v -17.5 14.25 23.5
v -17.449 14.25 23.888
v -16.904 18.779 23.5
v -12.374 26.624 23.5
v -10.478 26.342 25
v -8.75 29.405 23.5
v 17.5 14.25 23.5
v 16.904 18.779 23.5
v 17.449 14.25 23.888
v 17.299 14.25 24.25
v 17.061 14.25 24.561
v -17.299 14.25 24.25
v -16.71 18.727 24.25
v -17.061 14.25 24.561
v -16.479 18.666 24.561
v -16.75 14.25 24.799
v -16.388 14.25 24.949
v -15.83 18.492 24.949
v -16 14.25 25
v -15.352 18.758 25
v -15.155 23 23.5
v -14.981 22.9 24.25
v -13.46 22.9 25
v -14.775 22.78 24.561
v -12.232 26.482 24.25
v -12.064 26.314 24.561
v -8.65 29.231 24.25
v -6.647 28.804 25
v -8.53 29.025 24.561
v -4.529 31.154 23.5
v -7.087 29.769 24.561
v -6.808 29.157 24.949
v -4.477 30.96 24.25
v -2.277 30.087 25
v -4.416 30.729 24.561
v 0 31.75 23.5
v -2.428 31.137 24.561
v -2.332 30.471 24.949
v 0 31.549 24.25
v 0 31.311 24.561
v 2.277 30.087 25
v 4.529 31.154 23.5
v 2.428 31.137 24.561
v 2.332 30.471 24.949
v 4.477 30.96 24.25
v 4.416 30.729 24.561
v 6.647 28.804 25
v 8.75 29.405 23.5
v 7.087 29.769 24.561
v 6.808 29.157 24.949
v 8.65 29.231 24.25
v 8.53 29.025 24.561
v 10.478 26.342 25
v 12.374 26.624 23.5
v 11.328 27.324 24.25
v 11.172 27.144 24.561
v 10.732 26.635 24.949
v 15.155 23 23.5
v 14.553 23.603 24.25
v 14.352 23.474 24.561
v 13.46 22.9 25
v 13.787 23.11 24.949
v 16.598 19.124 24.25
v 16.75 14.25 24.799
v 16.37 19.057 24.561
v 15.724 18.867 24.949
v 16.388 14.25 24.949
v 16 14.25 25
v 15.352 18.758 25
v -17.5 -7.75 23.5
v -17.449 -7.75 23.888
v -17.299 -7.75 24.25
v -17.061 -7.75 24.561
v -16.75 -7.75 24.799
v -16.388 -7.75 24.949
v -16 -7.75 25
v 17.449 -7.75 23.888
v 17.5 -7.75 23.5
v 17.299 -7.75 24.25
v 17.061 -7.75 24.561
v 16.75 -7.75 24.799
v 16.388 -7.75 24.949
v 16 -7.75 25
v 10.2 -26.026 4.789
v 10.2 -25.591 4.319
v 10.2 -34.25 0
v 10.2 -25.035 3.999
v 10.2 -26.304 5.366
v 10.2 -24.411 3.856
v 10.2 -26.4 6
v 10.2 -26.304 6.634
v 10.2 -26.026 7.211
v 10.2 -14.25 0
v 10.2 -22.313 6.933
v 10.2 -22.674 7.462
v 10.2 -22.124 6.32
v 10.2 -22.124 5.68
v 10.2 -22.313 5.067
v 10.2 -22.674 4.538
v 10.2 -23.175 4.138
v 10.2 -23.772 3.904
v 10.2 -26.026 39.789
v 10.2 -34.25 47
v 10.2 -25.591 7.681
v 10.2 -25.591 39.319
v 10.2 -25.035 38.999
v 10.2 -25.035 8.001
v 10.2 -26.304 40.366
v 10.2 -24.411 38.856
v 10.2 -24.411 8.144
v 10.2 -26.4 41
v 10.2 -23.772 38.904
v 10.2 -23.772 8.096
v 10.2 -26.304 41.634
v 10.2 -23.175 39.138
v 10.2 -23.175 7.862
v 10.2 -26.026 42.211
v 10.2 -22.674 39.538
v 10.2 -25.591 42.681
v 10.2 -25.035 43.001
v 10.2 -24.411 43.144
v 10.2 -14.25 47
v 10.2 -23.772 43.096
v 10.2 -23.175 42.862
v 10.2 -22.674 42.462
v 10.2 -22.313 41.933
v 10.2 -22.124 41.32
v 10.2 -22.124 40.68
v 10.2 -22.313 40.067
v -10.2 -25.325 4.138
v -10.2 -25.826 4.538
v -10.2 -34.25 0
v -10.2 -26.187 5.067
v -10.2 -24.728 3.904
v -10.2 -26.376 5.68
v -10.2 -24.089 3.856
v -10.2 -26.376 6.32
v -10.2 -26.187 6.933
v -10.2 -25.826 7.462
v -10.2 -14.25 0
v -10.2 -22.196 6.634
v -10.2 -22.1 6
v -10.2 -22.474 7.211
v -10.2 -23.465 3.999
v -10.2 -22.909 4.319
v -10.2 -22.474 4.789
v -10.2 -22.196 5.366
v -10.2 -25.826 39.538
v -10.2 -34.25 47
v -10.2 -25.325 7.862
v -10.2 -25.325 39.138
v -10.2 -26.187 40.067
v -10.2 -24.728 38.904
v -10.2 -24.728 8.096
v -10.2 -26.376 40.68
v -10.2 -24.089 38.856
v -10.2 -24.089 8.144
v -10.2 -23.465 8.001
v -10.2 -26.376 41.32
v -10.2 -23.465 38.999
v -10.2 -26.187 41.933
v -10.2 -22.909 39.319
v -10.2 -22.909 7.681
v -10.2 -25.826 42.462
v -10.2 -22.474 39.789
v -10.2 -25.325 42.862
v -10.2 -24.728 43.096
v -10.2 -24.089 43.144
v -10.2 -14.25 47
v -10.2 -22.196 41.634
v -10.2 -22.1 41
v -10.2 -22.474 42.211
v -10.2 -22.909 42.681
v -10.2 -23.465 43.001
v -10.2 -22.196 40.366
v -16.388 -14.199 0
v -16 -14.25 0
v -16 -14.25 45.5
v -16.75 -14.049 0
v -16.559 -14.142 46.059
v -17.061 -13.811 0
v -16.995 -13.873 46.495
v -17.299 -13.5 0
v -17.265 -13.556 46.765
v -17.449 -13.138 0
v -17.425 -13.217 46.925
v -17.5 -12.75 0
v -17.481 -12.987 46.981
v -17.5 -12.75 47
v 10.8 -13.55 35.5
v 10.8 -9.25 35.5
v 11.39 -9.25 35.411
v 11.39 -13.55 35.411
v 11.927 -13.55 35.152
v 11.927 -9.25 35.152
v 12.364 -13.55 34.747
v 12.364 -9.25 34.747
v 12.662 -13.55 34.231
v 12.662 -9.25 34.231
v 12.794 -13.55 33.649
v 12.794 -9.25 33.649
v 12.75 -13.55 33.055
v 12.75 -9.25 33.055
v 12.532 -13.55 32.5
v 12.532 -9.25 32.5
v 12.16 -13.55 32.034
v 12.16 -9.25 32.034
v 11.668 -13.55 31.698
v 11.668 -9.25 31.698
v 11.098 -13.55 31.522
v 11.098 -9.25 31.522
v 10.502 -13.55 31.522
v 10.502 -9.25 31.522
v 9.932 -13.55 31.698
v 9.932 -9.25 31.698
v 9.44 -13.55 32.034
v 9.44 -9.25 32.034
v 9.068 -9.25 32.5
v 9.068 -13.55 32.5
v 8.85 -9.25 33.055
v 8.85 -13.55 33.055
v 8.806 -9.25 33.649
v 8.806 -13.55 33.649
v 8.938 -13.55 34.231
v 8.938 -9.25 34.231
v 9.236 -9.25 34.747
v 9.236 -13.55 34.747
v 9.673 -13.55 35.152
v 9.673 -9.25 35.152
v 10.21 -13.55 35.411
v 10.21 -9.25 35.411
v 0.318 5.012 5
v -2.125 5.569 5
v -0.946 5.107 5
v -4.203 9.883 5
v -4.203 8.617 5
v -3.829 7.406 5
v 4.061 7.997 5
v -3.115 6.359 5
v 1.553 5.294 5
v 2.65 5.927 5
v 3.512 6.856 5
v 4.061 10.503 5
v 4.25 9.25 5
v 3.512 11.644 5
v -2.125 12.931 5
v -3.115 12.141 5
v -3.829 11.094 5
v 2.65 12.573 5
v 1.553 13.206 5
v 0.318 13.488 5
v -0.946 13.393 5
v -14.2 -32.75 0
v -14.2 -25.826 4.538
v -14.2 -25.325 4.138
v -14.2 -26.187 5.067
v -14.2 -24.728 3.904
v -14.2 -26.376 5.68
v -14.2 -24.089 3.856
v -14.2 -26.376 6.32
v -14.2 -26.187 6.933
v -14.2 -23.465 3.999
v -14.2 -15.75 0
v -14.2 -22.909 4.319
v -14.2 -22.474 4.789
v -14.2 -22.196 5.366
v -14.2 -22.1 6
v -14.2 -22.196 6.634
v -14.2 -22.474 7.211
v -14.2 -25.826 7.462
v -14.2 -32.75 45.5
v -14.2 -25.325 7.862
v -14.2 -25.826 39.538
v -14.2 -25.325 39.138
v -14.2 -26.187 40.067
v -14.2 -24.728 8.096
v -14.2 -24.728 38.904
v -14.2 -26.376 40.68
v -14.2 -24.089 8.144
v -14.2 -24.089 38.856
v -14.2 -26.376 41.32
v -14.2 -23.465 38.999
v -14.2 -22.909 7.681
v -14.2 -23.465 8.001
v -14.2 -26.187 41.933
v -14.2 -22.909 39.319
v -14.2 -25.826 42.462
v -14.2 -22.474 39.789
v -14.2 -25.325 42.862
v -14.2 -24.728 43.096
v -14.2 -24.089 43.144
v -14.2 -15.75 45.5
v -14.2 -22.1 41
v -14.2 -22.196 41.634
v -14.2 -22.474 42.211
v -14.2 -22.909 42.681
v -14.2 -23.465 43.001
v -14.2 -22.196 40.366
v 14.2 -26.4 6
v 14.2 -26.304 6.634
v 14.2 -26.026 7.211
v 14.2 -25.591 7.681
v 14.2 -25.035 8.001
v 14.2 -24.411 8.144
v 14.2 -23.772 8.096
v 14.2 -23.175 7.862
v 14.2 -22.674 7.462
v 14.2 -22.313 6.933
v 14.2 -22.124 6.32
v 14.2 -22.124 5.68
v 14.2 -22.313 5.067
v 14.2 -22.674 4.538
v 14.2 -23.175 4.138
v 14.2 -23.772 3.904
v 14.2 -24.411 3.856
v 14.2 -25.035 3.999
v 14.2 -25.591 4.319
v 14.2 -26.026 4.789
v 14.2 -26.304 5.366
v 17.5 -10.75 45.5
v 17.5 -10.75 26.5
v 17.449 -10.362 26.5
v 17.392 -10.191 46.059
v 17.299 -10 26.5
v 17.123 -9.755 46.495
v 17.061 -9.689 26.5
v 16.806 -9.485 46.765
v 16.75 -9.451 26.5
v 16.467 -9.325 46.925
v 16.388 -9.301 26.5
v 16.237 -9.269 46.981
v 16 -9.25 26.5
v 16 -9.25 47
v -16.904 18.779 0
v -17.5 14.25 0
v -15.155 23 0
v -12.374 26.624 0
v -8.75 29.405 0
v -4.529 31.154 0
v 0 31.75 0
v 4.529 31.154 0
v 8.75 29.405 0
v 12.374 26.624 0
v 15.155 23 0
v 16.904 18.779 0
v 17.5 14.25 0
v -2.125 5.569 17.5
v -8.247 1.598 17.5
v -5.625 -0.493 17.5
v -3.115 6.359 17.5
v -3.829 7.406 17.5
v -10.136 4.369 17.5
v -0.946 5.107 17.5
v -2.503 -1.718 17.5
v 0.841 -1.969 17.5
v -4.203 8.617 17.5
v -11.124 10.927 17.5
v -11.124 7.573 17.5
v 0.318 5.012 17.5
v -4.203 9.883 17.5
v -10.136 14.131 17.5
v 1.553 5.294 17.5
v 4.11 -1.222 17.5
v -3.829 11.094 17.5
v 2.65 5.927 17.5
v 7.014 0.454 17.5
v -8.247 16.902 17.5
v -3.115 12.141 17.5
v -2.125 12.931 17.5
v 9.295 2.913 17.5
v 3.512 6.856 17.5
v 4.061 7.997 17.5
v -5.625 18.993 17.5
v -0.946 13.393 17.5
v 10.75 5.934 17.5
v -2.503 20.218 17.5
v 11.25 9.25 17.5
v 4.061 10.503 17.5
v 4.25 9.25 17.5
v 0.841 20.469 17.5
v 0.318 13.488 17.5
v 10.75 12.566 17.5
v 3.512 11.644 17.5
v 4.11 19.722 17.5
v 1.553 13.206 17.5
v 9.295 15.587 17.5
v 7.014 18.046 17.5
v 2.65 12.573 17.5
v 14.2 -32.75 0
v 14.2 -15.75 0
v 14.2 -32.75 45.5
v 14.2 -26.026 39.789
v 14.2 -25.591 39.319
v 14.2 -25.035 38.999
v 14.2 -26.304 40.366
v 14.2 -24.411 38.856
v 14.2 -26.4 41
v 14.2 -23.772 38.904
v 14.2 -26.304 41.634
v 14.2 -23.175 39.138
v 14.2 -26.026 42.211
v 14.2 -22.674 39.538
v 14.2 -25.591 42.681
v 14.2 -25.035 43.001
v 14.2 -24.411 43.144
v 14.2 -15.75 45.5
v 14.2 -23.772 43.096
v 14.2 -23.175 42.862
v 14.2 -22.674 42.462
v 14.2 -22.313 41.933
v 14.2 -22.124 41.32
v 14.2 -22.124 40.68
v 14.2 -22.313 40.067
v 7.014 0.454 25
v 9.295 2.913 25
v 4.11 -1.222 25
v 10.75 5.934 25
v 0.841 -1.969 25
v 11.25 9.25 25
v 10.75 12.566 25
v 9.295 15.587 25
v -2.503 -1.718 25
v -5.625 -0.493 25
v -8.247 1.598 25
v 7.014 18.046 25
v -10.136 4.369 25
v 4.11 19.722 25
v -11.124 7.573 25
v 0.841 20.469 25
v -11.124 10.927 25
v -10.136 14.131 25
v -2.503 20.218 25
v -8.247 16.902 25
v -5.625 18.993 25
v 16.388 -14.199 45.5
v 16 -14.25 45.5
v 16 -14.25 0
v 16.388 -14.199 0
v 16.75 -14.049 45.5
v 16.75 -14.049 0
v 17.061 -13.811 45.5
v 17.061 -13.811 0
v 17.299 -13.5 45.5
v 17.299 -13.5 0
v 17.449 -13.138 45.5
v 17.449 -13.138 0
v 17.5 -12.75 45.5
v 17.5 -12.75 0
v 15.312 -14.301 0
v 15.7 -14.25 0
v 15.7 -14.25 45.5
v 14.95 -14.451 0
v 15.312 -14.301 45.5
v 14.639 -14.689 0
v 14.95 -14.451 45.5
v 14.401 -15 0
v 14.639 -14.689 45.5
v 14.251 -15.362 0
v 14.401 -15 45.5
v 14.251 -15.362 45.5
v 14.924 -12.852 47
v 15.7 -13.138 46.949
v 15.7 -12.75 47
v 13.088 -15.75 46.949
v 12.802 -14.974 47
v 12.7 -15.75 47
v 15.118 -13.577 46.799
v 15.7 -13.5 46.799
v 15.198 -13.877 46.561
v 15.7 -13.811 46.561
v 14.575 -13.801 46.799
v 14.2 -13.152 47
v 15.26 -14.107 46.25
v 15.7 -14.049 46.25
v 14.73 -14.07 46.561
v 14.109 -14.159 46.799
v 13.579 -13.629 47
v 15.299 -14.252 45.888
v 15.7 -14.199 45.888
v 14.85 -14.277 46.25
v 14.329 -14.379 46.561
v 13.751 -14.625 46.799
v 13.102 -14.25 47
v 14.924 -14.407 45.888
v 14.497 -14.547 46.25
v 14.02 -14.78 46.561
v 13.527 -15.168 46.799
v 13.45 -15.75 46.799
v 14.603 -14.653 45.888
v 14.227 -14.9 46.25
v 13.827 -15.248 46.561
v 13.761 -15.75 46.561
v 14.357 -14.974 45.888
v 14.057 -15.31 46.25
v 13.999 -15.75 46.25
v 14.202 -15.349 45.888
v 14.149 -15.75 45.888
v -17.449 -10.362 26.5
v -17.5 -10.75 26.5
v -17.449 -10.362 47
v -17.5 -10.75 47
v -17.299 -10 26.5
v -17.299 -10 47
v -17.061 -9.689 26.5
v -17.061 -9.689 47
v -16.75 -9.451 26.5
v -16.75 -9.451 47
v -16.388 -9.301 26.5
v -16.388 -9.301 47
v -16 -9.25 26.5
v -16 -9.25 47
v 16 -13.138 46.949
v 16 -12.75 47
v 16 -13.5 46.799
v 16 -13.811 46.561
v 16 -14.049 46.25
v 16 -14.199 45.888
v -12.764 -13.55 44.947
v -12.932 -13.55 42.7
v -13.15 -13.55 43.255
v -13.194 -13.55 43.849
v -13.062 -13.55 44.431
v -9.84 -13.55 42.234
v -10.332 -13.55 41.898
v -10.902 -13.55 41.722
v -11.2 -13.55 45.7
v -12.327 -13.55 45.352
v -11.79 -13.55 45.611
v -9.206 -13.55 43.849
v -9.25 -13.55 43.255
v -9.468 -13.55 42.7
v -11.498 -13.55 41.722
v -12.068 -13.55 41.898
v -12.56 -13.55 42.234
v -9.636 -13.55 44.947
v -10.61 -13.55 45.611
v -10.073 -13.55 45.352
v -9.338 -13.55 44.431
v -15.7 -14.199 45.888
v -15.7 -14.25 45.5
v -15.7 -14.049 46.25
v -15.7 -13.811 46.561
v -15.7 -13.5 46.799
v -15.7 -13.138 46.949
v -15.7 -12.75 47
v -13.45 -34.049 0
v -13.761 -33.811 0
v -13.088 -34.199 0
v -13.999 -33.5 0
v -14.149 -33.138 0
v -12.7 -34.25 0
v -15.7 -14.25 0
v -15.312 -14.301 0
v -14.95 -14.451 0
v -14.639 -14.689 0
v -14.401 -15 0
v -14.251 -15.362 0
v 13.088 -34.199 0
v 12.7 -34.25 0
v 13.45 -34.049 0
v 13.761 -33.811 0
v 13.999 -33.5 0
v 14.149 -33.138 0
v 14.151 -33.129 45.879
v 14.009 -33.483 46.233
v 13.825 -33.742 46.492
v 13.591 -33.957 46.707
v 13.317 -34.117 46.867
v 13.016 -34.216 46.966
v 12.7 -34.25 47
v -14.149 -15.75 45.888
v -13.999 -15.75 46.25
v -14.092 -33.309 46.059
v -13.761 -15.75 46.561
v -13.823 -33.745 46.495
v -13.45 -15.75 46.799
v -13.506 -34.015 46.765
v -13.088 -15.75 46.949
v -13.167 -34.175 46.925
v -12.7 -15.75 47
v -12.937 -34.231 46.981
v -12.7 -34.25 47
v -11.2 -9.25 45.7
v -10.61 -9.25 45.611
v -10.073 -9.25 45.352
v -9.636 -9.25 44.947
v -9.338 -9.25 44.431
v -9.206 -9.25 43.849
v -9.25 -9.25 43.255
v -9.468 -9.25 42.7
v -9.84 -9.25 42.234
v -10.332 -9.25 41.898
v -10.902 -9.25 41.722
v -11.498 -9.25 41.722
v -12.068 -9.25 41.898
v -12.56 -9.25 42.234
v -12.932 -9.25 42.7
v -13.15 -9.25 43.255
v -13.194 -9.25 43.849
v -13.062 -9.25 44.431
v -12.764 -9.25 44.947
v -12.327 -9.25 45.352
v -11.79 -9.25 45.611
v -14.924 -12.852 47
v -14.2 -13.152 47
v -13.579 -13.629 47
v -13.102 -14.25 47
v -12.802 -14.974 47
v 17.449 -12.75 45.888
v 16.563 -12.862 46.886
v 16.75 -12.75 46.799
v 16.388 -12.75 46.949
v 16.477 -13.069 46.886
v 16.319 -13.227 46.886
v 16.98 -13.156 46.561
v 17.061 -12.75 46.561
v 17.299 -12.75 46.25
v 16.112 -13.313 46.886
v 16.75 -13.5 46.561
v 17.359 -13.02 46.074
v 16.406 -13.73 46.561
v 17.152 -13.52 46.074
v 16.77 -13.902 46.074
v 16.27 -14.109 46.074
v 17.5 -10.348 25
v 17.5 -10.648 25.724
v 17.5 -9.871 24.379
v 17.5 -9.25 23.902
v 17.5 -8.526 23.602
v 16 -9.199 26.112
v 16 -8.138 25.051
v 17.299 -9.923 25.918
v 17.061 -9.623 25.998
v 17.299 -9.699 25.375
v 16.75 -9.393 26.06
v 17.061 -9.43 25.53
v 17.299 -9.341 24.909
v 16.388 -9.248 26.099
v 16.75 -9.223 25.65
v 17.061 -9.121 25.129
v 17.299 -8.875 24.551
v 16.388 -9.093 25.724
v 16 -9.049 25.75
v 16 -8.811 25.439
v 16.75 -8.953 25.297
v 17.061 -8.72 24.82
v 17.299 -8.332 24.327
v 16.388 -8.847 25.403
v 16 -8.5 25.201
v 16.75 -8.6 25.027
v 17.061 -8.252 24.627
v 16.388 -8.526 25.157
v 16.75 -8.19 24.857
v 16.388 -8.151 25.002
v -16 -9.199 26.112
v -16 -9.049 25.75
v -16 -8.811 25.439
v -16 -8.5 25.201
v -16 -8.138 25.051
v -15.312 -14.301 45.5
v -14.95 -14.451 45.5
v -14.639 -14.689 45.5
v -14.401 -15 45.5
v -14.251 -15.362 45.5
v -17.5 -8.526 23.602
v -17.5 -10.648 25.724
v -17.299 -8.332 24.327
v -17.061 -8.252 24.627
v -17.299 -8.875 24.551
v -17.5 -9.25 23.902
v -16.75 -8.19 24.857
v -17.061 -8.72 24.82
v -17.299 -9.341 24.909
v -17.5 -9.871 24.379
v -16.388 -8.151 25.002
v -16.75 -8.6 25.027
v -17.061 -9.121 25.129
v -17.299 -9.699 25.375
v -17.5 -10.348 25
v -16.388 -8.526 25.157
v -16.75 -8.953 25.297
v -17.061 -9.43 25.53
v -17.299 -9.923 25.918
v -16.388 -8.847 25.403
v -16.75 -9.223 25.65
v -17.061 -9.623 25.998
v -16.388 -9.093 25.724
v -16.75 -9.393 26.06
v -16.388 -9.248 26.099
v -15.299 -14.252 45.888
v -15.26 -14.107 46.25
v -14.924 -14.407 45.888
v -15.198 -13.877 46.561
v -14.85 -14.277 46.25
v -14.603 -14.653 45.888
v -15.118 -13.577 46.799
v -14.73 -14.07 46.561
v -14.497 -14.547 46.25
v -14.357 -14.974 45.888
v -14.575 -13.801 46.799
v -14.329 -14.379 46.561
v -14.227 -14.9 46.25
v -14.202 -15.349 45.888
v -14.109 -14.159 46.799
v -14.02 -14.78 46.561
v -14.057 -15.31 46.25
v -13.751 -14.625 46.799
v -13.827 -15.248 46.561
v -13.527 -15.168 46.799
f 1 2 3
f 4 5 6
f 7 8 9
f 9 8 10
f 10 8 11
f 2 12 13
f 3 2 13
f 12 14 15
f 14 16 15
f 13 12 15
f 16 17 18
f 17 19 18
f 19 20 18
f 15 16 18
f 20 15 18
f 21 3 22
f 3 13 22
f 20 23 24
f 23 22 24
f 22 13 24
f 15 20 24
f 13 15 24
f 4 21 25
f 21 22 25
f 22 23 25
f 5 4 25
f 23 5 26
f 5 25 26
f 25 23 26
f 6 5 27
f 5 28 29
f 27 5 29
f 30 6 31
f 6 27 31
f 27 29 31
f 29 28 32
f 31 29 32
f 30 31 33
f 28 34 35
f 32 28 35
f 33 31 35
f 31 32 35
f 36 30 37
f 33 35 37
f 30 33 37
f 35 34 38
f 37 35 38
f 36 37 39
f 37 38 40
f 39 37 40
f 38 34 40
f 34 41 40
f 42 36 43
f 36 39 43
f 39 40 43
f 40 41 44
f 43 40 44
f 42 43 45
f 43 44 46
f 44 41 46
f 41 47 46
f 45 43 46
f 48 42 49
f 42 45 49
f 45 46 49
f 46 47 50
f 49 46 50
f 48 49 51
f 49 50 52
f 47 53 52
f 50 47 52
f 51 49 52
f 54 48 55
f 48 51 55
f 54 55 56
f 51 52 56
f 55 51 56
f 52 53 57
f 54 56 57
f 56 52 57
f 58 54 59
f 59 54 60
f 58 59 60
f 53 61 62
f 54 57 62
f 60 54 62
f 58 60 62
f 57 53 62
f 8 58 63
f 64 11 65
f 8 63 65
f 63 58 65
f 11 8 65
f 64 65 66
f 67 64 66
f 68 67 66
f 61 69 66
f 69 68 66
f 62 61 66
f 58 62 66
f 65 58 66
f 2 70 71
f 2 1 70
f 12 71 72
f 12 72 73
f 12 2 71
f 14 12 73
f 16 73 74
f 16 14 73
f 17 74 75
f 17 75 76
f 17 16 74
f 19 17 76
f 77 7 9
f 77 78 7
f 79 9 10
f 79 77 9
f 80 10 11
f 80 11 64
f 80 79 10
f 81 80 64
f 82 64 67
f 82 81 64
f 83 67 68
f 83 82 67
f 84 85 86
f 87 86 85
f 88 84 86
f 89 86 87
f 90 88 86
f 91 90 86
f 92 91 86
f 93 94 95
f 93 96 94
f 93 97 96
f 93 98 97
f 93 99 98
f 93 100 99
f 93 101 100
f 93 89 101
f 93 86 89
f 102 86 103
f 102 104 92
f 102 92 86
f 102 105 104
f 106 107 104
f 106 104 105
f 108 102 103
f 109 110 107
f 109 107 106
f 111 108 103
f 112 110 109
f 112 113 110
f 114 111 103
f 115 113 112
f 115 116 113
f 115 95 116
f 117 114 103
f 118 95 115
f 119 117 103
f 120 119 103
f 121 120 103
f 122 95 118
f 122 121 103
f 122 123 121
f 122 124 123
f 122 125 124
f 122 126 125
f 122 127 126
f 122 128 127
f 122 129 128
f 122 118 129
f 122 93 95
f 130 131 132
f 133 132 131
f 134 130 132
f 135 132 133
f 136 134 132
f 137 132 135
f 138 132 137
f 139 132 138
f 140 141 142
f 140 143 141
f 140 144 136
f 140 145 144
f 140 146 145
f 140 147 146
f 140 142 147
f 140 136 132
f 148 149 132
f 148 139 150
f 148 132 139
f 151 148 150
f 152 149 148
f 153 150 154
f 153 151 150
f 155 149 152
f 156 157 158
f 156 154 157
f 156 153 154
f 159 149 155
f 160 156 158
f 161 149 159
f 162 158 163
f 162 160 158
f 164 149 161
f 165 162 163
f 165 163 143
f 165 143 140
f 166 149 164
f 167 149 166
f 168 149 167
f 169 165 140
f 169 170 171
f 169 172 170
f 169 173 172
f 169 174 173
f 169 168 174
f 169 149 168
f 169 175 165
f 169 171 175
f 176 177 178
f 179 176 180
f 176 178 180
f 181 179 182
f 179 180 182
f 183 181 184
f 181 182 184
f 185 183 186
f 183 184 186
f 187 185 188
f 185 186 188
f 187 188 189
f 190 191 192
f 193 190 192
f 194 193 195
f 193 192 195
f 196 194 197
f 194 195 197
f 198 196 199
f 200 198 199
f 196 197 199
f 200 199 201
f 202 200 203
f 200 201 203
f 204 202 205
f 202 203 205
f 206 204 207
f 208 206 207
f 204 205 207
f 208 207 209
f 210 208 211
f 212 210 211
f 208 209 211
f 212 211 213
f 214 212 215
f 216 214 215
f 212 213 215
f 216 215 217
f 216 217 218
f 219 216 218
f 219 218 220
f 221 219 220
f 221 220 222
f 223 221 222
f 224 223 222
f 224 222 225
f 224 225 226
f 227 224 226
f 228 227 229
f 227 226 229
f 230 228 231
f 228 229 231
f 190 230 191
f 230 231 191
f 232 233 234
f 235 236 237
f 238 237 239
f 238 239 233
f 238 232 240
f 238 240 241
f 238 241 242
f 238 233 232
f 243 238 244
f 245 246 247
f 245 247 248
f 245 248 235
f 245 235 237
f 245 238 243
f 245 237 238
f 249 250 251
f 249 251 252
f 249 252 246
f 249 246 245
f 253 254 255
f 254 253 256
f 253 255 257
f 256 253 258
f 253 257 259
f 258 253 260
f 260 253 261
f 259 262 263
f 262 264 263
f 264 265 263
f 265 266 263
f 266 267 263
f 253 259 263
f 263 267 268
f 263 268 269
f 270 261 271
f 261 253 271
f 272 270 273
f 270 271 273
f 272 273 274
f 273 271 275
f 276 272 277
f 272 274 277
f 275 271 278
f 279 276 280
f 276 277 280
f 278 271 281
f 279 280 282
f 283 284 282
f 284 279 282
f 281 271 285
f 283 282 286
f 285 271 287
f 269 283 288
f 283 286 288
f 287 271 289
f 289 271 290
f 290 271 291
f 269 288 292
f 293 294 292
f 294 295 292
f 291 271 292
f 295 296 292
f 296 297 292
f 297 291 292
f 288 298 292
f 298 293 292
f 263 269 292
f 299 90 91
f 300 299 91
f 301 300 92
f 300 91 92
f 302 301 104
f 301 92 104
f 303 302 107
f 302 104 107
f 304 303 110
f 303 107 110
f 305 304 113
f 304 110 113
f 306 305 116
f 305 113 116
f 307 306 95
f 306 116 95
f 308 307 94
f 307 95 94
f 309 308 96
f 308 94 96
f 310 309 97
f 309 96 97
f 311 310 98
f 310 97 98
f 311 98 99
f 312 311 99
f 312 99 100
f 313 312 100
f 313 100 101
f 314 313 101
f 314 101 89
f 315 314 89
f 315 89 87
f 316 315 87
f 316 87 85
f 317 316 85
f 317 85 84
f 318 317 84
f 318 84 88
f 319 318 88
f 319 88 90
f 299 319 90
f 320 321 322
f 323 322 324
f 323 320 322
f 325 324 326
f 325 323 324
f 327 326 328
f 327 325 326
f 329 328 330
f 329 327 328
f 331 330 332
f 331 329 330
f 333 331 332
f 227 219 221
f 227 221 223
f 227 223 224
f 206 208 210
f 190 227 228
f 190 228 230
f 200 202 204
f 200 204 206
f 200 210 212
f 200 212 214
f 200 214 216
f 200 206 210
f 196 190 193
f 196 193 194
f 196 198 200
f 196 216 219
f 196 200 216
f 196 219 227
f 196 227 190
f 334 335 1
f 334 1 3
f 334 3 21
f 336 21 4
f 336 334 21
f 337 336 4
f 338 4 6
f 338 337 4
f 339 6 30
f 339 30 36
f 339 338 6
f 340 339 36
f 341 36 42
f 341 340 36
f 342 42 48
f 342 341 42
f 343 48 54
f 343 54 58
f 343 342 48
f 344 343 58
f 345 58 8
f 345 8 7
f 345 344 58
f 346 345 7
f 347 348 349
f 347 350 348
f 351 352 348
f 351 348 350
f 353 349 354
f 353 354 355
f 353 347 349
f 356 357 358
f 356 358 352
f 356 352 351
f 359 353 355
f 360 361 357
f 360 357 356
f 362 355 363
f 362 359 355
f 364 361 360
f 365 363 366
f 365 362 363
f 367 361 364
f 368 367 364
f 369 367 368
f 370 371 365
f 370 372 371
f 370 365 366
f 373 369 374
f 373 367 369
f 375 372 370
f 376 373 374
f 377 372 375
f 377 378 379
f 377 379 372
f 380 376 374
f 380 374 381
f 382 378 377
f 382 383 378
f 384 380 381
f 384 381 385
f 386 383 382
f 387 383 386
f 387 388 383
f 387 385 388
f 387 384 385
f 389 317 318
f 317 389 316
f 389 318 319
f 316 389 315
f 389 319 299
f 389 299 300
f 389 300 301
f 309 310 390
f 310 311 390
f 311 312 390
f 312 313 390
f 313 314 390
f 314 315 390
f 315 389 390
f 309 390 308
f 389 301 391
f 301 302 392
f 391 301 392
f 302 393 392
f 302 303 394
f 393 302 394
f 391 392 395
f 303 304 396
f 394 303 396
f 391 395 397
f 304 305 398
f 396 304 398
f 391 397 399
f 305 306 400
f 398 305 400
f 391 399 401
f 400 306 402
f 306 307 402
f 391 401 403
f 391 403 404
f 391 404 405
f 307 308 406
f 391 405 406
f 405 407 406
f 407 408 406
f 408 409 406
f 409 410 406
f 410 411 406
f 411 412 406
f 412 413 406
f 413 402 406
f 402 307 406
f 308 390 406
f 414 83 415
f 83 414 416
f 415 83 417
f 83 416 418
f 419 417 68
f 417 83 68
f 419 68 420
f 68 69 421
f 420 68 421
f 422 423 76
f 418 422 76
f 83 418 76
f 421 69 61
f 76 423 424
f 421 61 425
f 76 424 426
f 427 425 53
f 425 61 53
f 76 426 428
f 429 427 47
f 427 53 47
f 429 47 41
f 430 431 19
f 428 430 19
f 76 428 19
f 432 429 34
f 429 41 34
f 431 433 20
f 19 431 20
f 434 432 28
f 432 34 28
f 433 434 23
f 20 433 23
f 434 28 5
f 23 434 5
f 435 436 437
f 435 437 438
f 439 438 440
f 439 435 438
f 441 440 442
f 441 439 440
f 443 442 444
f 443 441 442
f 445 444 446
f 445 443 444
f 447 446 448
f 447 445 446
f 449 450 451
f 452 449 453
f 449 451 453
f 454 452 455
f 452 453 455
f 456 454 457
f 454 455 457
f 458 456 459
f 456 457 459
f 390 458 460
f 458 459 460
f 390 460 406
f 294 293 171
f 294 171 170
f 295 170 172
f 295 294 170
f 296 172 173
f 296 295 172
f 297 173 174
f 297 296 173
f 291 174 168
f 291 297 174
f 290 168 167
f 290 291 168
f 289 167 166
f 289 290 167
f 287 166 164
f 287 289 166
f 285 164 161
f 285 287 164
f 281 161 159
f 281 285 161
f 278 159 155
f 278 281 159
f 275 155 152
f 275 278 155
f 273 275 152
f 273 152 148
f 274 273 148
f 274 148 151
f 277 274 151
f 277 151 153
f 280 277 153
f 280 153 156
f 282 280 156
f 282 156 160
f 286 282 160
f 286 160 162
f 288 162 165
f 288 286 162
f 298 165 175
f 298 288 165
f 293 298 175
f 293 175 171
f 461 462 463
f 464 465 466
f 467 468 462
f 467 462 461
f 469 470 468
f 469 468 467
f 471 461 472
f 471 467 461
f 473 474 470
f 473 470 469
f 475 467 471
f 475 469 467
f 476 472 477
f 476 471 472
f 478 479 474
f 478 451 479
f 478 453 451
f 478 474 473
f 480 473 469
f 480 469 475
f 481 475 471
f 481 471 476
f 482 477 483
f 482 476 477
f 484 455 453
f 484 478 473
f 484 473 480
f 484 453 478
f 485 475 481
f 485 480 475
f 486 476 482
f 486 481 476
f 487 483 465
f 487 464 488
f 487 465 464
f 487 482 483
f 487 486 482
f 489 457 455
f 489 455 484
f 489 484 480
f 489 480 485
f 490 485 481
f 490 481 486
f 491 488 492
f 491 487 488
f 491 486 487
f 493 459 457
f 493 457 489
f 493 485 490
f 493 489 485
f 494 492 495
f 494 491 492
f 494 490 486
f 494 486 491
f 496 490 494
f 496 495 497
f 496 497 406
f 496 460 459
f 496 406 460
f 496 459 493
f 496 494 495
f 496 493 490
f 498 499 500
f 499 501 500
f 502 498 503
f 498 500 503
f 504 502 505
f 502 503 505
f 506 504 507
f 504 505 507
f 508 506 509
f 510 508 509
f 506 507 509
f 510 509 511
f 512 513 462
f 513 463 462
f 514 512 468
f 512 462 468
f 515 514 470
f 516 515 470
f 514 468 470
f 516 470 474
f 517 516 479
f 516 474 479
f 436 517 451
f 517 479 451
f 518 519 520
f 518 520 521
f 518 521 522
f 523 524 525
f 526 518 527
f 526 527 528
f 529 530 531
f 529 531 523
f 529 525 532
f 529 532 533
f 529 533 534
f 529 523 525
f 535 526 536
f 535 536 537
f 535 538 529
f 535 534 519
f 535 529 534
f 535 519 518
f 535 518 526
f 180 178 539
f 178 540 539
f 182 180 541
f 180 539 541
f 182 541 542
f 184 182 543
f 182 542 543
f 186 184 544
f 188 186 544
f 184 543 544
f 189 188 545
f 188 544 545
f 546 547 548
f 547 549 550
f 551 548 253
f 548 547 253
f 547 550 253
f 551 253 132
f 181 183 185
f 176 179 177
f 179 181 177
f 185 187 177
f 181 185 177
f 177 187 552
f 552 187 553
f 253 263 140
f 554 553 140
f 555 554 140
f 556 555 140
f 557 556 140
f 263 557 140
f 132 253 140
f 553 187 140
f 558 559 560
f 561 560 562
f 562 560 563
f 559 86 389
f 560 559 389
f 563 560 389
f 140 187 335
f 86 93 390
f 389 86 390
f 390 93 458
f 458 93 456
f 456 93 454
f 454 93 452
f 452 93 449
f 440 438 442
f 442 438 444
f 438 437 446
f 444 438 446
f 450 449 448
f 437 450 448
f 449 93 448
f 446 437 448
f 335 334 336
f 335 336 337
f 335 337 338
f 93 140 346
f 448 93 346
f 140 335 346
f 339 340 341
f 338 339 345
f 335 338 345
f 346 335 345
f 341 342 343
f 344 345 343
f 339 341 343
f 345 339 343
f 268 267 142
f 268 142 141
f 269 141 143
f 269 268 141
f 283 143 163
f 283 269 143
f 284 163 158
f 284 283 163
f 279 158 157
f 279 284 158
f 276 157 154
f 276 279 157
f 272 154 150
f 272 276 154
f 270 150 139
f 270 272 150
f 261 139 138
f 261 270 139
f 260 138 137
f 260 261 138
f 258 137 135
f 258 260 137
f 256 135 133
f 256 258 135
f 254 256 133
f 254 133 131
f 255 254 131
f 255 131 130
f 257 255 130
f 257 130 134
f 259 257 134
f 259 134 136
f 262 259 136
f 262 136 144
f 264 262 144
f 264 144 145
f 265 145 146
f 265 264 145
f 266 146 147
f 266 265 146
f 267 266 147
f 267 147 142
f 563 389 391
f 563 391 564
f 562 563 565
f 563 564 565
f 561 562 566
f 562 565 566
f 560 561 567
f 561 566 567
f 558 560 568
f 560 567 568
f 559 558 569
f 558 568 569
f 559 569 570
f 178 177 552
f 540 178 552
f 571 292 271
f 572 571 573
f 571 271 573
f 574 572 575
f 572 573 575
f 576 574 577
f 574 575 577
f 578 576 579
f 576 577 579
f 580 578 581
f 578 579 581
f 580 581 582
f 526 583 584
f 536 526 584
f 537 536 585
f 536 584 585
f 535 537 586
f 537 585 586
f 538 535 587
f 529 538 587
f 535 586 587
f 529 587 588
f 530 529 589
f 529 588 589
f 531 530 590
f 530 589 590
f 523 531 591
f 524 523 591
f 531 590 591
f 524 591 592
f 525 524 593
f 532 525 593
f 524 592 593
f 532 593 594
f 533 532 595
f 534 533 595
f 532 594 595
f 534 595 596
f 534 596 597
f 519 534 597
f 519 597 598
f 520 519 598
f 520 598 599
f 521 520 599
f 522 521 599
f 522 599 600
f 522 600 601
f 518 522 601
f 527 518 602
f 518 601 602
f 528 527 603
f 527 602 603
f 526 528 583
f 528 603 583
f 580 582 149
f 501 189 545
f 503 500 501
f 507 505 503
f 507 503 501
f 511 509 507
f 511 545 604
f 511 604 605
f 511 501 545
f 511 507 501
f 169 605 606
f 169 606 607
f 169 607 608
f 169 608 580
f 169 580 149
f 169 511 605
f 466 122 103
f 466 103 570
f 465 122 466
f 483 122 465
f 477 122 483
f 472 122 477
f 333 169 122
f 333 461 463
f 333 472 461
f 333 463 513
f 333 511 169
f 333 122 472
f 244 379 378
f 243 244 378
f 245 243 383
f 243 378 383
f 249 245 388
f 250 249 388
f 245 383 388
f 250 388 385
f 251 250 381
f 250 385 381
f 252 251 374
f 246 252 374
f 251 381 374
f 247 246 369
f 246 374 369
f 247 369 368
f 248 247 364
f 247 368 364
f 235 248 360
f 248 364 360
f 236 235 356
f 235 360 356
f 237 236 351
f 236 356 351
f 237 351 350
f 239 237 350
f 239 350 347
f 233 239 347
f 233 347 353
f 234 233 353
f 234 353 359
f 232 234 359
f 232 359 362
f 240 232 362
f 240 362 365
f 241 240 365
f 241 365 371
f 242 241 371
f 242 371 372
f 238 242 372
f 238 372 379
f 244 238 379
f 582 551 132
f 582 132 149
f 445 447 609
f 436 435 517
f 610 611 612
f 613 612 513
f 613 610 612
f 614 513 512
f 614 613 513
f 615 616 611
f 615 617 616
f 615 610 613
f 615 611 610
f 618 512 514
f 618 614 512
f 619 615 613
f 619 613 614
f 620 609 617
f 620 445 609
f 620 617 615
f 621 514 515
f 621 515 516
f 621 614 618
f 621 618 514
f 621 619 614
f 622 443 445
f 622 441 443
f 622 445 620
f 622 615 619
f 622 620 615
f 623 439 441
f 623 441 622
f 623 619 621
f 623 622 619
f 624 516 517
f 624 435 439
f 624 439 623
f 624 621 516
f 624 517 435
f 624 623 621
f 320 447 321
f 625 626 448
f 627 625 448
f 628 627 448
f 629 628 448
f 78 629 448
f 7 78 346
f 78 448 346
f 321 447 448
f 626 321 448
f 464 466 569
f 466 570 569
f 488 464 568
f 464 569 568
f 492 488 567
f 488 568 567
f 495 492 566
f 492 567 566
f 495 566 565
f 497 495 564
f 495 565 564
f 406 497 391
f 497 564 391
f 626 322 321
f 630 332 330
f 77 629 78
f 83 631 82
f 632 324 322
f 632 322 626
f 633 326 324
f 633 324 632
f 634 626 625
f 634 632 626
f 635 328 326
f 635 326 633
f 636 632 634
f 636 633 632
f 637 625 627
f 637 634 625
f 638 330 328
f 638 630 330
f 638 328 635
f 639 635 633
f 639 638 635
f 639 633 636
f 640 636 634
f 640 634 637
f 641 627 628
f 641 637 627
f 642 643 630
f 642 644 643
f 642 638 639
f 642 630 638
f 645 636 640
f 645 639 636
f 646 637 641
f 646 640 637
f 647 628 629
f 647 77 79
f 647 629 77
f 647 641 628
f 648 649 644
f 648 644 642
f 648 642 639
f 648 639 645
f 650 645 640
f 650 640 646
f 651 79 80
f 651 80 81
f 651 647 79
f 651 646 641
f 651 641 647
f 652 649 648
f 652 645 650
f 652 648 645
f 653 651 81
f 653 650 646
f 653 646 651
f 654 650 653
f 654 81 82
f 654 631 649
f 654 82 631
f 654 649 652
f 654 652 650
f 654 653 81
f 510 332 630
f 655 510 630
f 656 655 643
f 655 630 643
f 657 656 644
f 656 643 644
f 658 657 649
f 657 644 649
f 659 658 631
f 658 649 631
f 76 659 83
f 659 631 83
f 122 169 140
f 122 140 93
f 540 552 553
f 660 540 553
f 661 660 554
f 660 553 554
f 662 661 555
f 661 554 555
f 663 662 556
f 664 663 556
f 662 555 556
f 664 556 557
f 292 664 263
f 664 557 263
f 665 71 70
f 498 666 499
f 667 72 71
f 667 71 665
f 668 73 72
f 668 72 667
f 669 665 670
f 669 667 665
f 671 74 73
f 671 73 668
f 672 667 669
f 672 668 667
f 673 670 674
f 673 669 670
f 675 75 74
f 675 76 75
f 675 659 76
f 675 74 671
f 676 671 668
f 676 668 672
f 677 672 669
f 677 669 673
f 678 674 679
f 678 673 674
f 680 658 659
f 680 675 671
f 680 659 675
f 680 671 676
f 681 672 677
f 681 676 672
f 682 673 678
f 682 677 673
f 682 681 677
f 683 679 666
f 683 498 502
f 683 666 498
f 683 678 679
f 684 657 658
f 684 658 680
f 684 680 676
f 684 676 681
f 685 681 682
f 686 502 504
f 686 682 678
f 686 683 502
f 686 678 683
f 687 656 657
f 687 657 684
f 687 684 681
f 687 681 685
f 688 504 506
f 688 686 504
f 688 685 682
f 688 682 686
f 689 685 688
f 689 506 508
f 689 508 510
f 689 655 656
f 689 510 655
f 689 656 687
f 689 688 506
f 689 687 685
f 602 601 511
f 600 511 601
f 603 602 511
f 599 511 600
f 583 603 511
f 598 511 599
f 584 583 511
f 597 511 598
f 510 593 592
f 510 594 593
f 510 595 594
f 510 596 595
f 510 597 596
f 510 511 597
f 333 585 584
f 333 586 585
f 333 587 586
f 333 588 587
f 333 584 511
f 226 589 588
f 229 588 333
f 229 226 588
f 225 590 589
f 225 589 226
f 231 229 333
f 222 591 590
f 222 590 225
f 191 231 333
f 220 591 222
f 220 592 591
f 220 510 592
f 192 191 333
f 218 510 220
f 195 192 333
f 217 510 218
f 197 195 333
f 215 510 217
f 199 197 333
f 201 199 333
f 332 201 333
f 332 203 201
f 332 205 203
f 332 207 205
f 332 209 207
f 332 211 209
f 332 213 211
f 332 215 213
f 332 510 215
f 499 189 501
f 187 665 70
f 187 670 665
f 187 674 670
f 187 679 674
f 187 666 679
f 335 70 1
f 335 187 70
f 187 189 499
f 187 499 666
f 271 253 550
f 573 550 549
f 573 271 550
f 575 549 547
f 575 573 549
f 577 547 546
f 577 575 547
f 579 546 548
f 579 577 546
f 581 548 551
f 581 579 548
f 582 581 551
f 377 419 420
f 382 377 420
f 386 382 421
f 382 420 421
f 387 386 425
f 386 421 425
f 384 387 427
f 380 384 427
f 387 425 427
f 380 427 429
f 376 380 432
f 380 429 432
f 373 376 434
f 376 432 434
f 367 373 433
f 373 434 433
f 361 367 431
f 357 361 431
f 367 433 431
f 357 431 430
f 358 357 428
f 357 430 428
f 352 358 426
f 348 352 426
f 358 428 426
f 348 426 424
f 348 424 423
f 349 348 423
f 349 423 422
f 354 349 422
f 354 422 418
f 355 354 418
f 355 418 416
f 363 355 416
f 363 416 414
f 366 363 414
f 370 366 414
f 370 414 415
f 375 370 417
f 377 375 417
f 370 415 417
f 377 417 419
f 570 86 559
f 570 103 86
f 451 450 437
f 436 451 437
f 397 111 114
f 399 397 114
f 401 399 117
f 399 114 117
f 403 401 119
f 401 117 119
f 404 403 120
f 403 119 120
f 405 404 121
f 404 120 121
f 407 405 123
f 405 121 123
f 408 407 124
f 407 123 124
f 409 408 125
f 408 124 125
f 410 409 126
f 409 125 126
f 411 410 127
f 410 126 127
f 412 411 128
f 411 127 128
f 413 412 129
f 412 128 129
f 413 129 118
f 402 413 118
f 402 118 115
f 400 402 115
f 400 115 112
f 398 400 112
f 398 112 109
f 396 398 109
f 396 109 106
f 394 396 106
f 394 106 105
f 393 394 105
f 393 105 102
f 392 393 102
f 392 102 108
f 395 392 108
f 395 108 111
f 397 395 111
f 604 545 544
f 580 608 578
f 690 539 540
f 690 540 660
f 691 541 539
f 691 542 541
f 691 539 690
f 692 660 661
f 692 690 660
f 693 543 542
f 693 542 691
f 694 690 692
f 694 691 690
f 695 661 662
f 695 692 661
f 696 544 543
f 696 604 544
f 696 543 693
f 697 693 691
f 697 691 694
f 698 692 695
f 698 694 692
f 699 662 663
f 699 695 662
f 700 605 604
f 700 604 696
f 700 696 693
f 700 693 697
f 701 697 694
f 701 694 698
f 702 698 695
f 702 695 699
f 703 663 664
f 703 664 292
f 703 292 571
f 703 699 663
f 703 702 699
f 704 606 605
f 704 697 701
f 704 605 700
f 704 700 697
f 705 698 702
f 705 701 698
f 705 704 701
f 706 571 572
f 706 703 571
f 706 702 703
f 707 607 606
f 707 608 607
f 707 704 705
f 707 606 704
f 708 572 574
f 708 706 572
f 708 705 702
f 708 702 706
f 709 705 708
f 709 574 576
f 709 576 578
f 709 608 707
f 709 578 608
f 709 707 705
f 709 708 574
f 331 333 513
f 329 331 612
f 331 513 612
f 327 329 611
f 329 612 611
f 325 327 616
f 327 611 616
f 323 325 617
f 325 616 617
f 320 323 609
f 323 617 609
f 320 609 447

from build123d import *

# Parameters (mm, degrees)
SKETCH1_W           = 35
SKETCH1_H           = 28.5
BOSS_EXTRUDE1_DEPTH = 25
SKETCH2_R           = 4.25
CUT_EXTRUDE1_DEPTH  = 20
SKETCH3_R           = 11.25
CUT_EXTRUDE2_DEPTH  = 7.5
SKETCH9_W           = 35
SKETCH9_H           = 5
BOSS_EXTRUDE4_DEPTH = 22
SKETCH4_W           = 4
SKETCH4_H           = 47
BOSS_EXTRUDE2_DEPTH = 20
FILLET1_R           = 1.5
CUT_EXTRUDE3_REACH  = 66.415
SKETCH6_R           = 2.15
MIRROR1_START       = -14.2
MIRROR1_OUTLINE_W   = 20
MIRROR1_OUTLINE_H   = 47
MIRROR1_OUTLINE_R   = 2.15
MIRROR1_DEPTH       = 4
MIRROR1_2_DEPTH     = 47
FILLET2_R           = 1.5
SKETCH10_R          = 2
CUT_EXTRUDE4_DEPTH  = 4.3


with BuildPart() as part:
    # Sketch1 → Boss-Extrude1 (new body)
    with BuildSketch(Plane.XY):
        with BuildLine():
            ThreePointArc((-17.5, 14.25), (0, 31.75), (17.5, 14.25))
            Line((17.5, 14.25), (-17.5, 14.25))
        make_face()
        Rectangle(SKETCH1_W, SKETCH1_H)
    extrude(amount=BOSS_EXTRUDE1_DEPTH)

    # Sketch2 → Cut-Extrude1 (cut)
    with BuildSketch(Plane.XY.offset(25)):
        with Locations((0, 9.25)):
            Circle(SKETCH2_R)
    extrude(amount=-CUT_EXTRUDE1_DEPTH, mode=Mode.SUBTRACT)

    # Sketch3 → Cut-Extrude2 (cut)
    with BuildSketch(Plane.XY.offset(25)):
        with Locations((0, 9.25)):
            Circle(SKETCH3_R)
    extrude(amount=-CUT_EXTRUDE2_DEPTH, mode=Mode.SUBTRACT)

    # Sketch9 → Boss-Extrude4 (add)
    with BuildSketch(Plane.XY.offset(25)):
        with Locations((0, -11.75)):
            Rectangle(SKETCH9_W, SKETCH9_H)
    extrude(amount=BOSS_EXTRUDE4_DEPTH)

    # Sketch4 → Boss-Extrude2 (add)
    with BuildSketch(Plane.XZ.offset(14.25)):
        with Locations((12.2, 23.5)):
            Rectangle(SKETCH4_W, SKETCH4_H)
    extrude(amount=BOSS_EXTRUDE2_DEPTH)

    # Fillet1
    fillet1_edges = [part.edges().sort_by_distance(p)[0] for p in [
        (14.2, -14.25, 23.5),
        (17.5, -14.25, 23.5),
    ]]
    fillet(fillet1_edges, radius=FILLET1_R)

    # Sketch6 → Cut-Extrude3 (cut, up to next)
    with BuildSketch(Plane.ZY.offset(-10.2), mode=Mode.PRIVATE) as cut_extrude3_sk1:
        with Locations(Location((6, -24.25, 0), (0, 0, 270))):
            Circle(SKETCH6_R)
    cut_extrude3_tool1 = extrude(cut_extrude3_sk1.sketch, amount=-CUT_EXTRUDE3_REACH, mode=Mode.PRIVATE) & part.part
    # Sketch6 → Cut-Extrude3 (cut, up to next)
    with BuildSketch(Plane.ZY.offset(-10.2), mode=Mode.PRIVATE) as cut_extrude3_sk2:
        with Locations(Location((41, -24.25, 0), (0, 0, 270))):
            Circle(SKETCH6_R)
    cut_extrude3_tool2 = extrude(cut_extrude3_sk2.sketch, amount=-CUT_EXTRUDE3_REACH, mode=Mode.PRIVATE) & part.part
    add(cut_extrude3_tool1.solids().sort_by_distance((10.2, -24.25, 6))[0], mode=Mode.SUBTRACT)
    add(cut_extrude3_tool2.solids().sort_by_distance((10.2, -24.25, 41))[0], mode=Mode.SUBTRACT)

    # Mirror1: read off the stored shape, not the designer's step
    # Mirror1 outline → Mirror1 (add)
    with BuildSketch(Plane.YZ.offset(MIRROR1_START)):
        with Locations((-24.25, 23.5)):
            Rectangle(MIRROR1_OUTLINE_W, MIRROR1_OUTLINE_H)
        with Locations((-24.25, 6)):
            Circle(MIRROR1_OUTLINE_R, mode=Mode.SUBTRACT)
        with Locations((-24.25, 41)):
            Circle(MIRROR1_OUTLINE_R, mode=Mode.SUBTRACT)
    extrude(amount=MIRROR1_DEPTH)

    # Mirror1 2 outline → Mirror1 2 (add)
    with BuildSketch(Plane.XY):
        with BuildLine():
            Line((-14.2, -14.25), (-15.7, -14.25))
            ThreePointArc((-15.7, -14.25), (-14.639339828, -14.689339828), (-14.2, -15.75))
            Line((-14.2, -15.75), (-14.2, -14.25))
        make_face()
    extrude(amount=MIRROR1_2_DEPTH)

    # Fillet2
    fillet2_edges = [part.edges().sort_by_distance(p)[0] for p in [
        (-17.5, 2.5, 25),
        (17.5, 2.5, 25),
        (-17.5, -9.25, 36),
        (0, -9.25, 25),
        (17.5, -9.25, 36),
        (-16.6, -14.25, 47),
        (14.2, -25, 47),
        (14.2, -34.25, 23.5),
        (0, 31.75, 25),
        (17.5, -11, 47),
        (15.85, -14.25, 47),
        (17.060660172, -13.810660172, 47),
        (14.639339828, -14.689339828, 47),
        (-14.2, -34.25, 23.5),
        (-14.2, -25, 47),
        (-14.639339828, -14.689339828, 47),
        (-17.5, -14.25, 23.5),
    ]]
    fillet(fillet2_edges, radius=FILLET2_R)

    # Sketch10 → Cut-Extrude4 (cut)
    with BuildSketch(Plane(origin=(0, -9.25, 0), x_dir=(1, 0, 0), z_dir=(0, 1, 0))):
        with Locations(Location((10.8, -33.5, 0), (0, 0, 270))):
            Circle(SKETCH10_R)
        with Locations(Location((-11.2, -43.7, 0), (0, 0, 270))):
            Circle(SKETCH10_R)
    extrude(amount=-CUT_EXTRUDE4_DEPTH, mode=Mode.SUBTRACT)


solid = part.part
